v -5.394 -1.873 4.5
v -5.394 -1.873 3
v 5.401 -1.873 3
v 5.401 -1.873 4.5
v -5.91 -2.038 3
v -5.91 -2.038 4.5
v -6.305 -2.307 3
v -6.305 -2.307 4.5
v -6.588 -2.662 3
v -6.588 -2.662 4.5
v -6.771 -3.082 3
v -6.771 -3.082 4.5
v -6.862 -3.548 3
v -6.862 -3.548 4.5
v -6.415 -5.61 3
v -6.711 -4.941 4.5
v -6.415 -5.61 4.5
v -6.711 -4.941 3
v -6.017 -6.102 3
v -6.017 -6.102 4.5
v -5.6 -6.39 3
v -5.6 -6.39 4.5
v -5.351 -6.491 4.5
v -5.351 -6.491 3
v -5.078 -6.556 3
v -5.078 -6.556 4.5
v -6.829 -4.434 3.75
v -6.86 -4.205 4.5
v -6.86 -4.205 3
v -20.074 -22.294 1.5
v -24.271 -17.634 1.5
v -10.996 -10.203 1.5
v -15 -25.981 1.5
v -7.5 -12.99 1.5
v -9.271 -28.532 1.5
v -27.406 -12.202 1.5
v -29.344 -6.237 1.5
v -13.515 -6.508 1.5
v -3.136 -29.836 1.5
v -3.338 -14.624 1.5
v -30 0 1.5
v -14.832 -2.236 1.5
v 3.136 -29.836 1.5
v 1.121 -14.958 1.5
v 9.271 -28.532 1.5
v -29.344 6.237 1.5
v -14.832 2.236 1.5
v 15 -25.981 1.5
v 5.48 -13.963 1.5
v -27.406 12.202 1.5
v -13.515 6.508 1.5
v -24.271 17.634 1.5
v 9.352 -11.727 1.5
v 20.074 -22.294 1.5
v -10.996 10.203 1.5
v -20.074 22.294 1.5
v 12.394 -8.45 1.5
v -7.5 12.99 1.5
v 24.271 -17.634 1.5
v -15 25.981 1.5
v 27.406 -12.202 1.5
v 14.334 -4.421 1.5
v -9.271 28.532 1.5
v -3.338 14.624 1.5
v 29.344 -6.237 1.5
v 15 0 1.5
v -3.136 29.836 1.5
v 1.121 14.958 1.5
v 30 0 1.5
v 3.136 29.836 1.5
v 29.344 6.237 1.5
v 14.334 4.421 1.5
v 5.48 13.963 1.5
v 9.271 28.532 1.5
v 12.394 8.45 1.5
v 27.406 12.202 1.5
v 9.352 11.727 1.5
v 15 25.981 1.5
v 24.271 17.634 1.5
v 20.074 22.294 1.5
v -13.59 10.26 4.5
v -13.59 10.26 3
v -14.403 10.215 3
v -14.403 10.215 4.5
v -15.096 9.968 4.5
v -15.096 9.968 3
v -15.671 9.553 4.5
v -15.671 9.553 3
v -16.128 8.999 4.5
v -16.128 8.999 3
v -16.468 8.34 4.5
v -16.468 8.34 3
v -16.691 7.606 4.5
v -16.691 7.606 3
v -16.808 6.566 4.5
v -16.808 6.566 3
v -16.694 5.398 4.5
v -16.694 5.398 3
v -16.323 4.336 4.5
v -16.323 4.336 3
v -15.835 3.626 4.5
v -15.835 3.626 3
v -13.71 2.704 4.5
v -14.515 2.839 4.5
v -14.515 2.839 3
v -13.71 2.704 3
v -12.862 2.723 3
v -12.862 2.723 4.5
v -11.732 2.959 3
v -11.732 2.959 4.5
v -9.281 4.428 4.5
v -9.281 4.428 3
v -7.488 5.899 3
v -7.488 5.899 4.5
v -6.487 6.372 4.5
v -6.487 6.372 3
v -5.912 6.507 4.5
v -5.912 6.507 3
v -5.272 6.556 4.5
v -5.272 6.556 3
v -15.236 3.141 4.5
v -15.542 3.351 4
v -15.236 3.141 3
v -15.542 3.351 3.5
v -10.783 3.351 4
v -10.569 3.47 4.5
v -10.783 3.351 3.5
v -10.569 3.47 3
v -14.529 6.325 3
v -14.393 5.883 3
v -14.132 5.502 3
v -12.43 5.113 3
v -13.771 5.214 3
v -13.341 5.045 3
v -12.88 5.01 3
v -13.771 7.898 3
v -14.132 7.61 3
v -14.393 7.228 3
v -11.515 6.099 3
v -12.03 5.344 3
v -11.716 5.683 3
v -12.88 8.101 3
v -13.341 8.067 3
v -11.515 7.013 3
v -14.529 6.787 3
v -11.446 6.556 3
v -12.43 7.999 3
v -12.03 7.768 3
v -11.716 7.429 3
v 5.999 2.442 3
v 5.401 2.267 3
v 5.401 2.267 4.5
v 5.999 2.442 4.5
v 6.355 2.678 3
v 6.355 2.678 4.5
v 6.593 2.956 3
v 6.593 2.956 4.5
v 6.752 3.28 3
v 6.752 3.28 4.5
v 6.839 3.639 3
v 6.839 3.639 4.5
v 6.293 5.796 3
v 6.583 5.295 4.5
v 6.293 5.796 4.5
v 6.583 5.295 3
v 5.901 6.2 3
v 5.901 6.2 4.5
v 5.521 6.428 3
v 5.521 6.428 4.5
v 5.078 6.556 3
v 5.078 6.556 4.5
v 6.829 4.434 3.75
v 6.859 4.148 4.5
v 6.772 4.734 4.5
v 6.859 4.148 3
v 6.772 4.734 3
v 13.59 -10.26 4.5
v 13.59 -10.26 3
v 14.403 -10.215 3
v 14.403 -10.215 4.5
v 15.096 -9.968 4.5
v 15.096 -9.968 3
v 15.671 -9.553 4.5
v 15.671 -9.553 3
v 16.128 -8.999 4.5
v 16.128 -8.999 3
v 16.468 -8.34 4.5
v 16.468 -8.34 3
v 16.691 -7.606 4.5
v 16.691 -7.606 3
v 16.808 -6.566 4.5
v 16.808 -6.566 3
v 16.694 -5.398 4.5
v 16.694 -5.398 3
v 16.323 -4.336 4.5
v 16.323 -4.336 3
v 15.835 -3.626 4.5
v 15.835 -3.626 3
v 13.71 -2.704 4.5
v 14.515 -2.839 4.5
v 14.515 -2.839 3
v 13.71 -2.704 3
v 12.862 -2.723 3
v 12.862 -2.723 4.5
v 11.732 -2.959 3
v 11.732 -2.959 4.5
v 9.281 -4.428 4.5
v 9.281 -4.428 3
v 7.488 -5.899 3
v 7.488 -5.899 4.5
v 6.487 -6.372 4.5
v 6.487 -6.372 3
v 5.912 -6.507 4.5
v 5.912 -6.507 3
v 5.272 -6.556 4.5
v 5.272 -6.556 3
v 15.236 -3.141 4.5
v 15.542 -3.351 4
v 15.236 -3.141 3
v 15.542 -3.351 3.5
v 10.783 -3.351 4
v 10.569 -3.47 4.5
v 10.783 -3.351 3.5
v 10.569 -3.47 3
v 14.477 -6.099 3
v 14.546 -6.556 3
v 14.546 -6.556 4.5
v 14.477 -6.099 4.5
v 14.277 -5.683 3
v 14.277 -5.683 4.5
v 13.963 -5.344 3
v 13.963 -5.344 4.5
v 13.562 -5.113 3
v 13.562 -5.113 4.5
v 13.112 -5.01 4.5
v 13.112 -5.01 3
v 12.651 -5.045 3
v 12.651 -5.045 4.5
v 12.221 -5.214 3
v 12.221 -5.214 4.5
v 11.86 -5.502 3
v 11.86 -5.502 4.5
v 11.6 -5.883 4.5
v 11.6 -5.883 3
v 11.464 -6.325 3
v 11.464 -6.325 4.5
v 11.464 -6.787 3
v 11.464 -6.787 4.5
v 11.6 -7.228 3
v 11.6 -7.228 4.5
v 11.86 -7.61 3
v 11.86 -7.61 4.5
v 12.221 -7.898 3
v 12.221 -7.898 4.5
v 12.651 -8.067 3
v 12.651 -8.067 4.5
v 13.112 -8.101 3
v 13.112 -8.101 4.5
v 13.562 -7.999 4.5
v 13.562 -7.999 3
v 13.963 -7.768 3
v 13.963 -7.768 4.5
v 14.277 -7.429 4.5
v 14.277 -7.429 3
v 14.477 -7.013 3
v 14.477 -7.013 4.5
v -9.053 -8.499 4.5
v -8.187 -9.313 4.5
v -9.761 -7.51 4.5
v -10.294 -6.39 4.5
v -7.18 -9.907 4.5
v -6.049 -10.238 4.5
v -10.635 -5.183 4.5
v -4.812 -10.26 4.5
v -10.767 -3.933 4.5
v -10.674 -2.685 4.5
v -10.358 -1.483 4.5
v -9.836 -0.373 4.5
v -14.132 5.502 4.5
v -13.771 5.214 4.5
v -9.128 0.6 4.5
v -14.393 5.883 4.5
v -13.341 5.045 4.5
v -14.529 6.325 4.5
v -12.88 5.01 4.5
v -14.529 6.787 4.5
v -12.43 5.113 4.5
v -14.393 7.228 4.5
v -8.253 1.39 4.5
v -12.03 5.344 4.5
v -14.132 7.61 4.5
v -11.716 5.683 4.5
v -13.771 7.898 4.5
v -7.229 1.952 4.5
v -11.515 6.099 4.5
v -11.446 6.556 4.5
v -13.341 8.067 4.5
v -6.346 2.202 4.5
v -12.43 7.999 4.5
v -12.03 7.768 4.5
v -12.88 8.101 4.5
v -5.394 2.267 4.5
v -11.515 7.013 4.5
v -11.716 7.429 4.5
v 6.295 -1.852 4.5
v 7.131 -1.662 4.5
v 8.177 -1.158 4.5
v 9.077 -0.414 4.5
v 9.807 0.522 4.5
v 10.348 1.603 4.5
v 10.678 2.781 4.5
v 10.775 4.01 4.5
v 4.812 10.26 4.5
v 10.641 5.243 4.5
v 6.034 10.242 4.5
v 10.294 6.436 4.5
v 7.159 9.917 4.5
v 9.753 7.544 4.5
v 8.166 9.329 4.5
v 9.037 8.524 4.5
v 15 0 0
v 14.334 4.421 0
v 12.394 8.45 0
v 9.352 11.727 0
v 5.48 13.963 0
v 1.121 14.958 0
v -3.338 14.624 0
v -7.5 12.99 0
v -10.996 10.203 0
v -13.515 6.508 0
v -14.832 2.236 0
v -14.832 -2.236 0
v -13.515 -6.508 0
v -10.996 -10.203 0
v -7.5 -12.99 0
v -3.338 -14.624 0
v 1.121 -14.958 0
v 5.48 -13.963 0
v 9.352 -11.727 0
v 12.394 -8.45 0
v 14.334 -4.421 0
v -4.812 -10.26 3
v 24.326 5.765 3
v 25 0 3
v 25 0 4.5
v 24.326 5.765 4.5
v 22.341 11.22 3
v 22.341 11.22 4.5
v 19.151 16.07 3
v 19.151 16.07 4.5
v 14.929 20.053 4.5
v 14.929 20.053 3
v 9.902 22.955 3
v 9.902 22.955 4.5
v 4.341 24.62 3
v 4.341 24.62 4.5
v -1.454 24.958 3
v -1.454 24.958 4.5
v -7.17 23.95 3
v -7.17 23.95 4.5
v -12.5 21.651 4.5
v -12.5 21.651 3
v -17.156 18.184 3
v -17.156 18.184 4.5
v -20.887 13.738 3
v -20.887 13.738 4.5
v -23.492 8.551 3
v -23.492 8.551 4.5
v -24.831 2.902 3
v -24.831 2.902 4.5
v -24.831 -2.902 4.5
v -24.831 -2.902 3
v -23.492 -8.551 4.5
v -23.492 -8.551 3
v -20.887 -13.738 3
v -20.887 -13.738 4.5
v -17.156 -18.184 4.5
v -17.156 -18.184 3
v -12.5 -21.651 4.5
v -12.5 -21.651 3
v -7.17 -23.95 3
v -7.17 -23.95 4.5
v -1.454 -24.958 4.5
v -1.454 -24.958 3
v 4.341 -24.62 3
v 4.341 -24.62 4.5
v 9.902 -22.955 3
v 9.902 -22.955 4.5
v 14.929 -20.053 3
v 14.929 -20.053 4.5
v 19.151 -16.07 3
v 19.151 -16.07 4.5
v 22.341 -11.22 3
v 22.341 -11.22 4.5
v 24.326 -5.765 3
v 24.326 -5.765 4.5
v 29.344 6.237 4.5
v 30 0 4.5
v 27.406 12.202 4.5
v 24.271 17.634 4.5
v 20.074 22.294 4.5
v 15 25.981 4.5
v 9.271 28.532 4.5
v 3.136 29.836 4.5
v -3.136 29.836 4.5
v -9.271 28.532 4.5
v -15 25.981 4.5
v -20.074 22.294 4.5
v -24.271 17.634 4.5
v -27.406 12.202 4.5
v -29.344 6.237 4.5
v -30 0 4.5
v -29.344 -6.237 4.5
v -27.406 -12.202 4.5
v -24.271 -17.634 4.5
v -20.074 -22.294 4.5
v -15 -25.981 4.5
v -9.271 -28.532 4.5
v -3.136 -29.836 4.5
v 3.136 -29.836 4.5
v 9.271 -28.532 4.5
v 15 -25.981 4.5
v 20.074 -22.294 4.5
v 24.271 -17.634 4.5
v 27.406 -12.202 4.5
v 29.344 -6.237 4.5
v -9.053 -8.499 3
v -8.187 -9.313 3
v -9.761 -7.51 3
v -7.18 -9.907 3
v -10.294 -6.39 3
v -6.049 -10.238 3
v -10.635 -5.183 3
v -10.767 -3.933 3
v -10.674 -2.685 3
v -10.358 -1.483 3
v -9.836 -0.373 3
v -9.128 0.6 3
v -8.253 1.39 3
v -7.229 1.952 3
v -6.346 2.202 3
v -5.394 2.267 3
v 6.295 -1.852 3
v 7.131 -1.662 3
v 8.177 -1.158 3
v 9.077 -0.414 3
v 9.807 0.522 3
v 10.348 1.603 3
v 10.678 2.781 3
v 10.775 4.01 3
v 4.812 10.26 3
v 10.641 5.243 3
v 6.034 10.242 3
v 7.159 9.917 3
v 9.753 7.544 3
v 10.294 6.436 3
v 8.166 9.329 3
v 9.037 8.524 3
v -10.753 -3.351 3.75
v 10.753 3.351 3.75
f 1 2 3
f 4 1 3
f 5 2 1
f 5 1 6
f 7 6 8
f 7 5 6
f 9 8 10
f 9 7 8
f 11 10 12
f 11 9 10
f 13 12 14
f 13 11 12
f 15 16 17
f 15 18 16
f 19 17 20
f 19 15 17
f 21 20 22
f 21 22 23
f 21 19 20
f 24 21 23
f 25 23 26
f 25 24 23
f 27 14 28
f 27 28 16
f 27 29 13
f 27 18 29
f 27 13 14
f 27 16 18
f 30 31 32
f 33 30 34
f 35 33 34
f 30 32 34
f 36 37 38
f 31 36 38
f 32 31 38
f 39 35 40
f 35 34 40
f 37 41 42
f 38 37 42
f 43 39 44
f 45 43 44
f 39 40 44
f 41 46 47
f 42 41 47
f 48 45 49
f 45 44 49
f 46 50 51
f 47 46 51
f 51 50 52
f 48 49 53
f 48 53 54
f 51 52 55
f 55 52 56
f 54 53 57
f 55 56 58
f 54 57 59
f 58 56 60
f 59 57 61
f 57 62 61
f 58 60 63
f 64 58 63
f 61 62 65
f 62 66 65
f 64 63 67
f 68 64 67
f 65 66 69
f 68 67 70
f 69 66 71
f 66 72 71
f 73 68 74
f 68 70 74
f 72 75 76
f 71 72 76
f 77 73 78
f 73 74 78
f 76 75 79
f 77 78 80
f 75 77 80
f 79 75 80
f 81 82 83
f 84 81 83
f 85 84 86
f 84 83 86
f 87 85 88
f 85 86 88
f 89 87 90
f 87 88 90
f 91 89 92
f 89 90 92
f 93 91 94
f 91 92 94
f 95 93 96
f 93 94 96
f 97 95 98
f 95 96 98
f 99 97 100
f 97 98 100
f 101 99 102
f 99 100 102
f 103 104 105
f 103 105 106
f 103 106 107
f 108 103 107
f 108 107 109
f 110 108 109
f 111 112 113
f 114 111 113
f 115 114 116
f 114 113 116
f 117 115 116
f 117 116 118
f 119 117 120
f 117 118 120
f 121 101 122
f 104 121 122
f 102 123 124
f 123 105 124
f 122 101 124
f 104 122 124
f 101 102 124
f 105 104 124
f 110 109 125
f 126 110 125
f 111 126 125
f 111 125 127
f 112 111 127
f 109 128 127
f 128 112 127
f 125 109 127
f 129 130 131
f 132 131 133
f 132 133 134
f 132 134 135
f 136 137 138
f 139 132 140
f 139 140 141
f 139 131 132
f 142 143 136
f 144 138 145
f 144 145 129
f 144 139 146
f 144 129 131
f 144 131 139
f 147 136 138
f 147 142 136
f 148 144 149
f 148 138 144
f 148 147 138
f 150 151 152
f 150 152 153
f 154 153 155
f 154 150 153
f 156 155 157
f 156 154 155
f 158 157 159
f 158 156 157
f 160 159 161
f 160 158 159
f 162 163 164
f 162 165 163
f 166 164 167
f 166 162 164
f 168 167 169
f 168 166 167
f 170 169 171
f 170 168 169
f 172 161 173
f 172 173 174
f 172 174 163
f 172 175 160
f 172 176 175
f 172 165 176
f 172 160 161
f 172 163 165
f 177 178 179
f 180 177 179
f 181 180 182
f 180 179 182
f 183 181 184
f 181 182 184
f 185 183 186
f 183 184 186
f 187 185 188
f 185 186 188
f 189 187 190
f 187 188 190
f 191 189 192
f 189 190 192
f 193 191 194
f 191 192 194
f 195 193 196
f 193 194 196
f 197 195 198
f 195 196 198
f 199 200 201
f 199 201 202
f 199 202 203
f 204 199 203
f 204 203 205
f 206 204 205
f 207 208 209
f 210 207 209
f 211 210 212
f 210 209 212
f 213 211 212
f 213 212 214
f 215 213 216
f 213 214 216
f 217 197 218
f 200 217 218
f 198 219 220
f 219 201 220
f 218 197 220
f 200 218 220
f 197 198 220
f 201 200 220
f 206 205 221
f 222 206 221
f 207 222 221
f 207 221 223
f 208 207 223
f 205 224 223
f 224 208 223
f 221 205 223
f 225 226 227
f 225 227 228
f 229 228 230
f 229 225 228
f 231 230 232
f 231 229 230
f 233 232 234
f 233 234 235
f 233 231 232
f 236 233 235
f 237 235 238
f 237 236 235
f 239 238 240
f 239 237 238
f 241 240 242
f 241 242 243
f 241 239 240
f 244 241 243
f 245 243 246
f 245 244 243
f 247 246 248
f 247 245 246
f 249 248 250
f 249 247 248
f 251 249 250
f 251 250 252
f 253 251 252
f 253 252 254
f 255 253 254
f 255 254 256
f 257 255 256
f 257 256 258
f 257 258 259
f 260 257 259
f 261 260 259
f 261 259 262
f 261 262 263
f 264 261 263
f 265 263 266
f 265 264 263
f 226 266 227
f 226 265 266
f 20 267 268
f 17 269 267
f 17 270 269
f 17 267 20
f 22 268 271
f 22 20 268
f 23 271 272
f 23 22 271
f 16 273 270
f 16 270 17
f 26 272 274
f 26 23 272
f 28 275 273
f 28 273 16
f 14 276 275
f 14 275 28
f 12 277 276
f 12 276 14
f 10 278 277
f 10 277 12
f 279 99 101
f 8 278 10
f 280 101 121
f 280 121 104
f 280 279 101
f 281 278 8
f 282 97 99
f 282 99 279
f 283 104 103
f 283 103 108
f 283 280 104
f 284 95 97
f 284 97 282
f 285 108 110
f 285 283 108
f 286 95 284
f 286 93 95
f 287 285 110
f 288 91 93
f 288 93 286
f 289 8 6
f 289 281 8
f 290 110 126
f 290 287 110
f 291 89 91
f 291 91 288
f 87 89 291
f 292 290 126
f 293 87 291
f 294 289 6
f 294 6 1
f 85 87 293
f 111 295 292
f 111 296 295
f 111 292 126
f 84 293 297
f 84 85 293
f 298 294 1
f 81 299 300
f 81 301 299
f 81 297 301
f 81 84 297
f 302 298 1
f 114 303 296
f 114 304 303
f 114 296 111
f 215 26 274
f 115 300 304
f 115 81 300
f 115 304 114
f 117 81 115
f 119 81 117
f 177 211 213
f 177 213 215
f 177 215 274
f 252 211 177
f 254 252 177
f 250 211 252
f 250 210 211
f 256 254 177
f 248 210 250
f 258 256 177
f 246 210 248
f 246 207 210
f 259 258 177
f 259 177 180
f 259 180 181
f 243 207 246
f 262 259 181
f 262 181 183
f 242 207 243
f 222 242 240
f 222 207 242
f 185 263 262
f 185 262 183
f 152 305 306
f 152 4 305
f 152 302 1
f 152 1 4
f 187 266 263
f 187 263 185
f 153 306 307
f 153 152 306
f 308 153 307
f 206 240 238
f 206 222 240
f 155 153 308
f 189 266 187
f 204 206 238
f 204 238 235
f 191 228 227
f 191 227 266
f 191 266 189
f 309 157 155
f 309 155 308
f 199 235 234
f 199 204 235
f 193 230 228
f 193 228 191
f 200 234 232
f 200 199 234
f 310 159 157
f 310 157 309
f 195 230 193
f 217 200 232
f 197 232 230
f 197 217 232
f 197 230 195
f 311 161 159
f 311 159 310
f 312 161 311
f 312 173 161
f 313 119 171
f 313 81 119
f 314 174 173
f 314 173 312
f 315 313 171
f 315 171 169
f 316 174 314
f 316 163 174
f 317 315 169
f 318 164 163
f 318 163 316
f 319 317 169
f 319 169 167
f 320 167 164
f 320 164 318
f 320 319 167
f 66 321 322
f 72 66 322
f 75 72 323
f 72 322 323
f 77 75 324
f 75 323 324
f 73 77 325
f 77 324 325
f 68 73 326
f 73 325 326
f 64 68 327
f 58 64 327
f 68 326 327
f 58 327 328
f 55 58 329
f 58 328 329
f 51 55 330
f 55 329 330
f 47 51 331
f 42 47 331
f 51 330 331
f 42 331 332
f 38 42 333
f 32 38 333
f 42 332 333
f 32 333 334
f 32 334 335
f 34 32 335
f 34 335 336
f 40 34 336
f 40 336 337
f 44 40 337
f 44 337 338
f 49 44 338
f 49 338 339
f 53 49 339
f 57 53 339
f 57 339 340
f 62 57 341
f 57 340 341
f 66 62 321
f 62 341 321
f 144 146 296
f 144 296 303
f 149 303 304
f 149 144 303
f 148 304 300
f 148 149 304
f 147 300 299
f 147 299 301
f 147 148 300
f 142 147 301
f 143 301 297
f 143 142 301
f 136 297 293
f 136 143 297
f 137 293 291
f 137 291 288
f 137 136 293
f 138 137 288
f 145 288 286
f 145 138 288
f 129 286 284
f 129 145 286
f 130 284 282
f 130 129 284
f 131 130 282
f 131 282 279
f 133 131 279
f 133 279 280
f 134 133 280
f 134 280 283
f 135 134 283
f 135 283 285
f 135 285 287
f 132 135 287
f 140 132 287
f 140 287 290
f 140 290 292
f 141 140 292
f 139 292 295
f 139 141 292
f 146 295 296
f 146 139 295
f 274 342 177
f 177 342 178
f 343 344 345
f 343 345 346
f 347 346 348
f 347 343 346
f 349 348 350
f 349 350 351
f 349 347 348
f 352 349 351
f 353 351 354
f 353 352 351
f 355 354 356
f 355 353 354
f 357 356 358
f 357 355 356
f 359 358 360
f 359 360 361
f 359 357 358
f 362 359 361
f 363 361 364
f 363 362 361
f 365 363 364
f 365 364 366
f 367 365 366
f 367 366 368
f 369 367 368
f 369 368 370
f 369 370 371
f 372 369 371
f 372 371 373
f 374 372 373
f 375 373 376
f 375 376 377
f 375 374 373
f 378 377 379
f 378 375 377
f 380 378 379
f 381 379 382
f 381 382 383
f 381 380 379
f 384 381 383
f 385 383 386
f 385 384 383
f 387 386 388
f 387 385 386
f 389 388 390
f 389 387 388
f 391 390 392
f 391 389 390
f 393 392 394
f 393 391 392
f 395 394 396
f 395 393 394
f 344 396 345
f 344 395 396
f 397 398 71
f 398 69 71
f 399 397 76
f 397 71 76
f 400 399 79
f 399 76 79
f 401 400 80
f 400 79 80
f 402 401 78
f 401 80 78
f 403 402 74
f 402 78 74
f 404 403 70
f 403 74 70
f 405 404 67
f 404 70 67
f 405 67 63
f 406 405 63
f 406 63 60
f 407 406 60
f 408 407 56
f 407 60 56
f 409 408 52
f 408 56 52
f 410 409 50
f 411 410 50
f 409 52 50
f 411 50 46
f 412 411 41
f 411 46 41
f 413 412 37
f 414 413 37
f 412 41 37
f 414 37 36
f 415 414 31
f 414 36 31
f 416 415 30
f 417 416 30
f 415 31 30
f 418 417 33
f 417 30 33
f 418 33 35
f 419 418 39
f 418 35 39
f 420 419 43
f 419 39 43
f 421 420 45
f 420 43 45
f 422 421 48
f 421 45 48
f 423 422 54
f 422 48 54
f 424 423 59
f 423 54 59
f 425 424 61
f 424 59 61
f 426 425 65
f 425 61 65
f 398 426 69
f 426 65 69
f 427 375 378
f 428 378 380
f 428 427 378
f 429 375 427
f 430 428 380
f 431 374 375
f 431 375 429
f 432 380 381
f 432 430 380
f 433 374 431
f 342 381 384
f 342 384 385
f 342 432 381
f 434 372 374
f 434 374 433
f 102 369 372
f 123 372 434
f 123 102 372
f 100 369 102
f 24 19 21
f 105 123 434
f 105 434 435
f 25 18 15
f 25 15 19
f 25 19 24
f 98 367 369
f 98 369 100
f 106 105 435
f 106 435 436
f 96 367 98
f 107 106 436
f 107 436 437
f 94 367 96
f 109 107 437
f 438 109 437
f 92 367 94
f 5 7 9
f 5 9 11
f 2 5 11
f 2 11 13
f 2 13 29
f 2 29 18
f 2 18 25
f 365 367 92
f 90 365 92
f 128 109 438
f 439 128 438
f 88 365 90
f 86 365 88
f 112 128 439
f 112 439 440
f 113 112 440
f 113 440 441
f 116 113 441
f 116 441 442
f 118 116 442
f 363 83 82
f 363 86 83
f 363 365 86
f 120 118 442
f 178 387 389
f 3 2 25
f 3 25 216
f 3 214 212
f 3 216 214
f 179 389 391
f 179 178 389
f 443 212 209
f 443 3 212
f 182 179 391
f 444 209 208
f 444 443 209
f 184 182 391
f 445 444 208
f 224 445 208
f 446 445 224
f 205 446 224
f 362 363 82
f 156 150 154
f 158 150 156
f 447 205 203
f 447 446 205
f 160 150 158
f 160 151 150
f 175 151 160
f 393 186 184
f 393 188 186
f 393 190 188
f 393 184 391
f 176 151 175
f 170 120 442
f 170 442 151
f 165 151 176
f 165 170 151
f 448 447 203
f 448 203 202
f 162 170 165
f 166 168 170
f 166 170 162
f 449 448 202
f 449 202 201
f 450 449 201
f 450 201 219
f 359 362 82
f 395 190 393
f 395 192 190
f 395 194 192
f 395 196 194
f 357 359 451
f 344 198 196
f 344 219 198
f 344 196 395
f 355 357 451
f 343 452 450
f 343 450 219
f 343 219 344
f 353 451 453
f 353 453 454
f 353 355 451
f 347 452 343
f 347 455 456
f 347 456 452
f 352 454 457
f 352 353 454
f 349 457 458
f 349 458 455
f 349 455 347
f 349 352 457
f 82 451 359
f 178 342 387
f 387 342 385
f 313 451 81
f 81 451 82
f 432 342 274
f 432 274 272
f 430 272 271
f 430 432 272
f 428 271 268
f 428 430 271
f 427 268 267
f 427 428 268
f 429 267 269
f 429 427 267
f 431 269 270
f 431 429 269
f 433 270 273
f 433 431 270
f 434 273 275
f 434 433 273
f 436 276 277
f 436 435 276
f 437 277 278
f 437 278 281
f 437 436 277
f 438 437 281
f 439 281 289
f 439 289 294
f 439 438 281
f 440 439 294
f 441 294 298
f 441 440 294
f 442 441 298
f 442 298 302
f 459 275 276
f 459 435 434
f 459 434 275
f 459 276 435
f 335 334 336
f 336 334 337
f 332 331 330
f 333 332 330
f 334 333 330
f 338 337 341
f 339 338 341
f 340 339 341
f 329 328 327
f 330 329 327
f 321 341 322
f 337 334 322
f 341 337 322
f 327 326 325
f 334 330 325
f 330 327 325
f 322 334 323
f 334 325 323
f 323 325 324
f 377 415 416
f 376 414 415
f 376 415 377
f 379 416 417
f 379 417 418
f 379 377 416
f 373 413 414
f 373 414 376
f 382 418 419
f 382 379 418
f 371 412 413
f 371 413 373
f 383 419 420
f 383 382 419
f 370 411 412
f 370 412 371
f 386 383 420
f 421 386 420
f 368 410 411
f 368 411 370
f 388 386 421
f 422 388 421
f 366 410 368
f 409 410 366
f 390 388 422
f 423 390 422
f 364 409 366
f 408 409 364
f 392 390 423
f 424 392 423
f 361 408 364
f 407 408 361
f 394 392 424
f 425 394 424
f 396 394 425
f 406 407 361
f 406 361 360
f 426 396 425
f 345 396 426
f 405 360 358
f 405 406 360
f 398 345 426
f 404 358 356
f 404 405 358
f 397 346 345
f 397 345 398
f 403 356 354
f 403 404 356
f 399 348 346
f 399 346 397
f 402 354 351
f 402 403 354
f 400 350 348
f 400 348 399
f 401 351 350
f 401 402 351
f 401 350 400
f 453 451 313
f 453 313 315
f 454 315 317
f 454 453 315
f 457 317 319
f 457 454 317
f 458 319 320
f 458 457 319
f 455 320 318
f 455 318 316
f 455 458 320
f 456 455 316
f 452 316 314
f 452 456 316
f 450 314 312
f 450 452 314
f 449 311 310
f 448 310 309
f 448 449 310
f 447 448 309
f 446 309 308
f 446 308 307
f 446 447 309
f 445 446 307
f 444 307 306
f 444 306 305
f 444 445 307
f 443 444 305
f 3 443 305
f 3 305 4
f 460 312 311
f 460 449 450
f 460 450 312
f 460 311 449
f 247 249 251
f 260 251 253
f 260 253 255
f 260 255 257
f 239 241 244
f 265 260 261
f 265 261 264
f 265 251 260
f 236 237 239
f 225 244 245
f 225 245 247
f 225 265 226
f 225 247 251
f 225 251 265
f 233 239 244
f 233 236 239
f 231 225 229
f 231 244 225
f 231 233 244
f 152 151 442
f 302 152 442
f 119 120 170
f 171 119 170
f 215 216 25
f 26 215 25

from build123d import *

# Parameters (mm, degrees)
SZKIC2_R                    = 15
DODANIE_WYCI_GNI_CIE1_DEPTH = 1.5
SZKIC3_R                    = 30
DODANIE_WYCI_GNI_CIE2_DEPTH = 1.5
SZKIC4_R                    = 1.549896932
DODANIE_WYCI_GNI_CIE3_DEPTH = 1.5
SZKIC5_R                    = 30
SZKIC5_R_2                  = 25
DODANIE_WYCI_GNI_CIE4_DEPTH = 1.5


with BuildPart() as part:
    # Szkic2 → Dodanie-wyciągnięcie1 (new body)
    with BuildSketch(Plane.XY):
        Circle(SZKIC2_R)
    extrude(amount=DODANIE_WYCI_GNI_CIE1_DEPTH)

    # Szkic3 → Dodanie-wyciągnięcie2 (add)
    with BuildSketch(Plane.XY.offset(1.5)):
        Circle(SZKIC3_R)
    extrude(amount=DODANIE_WYCI_GNI_CIE2_DEPTH)

    # Szkic4 → Dodanie-wyciągnięcie3 (add)
    with BuildSketch(Plane.XY.offset(3)):
        with BuildLine():
            Line((4.812477136, 10.260072193), (-13.590223768, 10.260072193))
            add(Edge.make_bspline(
                [(-13.590223768, 10.260072193), (-17.118745335, 10.525910667), (-18.036890573, 2.046692384), (-9.462596481, 2.827097674), (-7.837333483, 6.548859819), (-5.272128066, 6.55590597)],
                knots=[0, 0, 0, 0, 0.432020753, 0.673133157, 1, 1, 1, 1], degree=3))
            Line((-5.272128066, 6.55590597), (5.077687391, 6.55590597))
            add(Edge.make_bspline(
                [(5.400788266, 2.266678597), (6.693166153, 2.459988983), (7.256310662, 4.478210573), (6.099978239, 6.399808673), (5.077687391, 6.55590597)],
                knots=[0, 0, 0, 0, 0.494793037, 1, 1, 1, 1], degree=3))
            Line((5.400788266, 2.266678597), (-5.393615059, 2.266678597))
            add(Edge.make_bspline(
                [(-4.812477136, -10.260072193), (-8.43662289, -10.67337056), (-13.131808051, -3.70534385), (-8.393582508, 2.373047437), (-5.393615059, 2.266678597)],
                knots=[0, 0, 0, 0, 0.544342745, 1, 1, 1, 1], degree=3))
            Line((-4.812477136, -10.260072193), (13.590223768, -10.260072193))
            add(Edge.make_bspline(
                [(13.590223768, -10.260072193), (17.118745335, -10.525910667), (18.036890573, -2.046692384), (9.462596481, -2.827097674), (7.837333483, -6.548859819), (5.272128066, -6.55590597)],
                knots=[0, 0, 0, 0, 0.432020753, 0.673133157, 1, 1, 1, 1], degree=3))
            Line((5.272128066, -6.55590597), (-5.077687391, -6.55590597))
            add(Edge.make_bspline(
                [(-5.393615059, -1.873220172), (-6.707130139, -2.111629026), (-7.285258718, -4.388625667), (-6.108553028, -6.392911018), (-5.077687391, -6.55590597)],
                knots=[0, 0, 0, 0, 0.526459521, 1, 1, 1, 1], degree=3))
            Line((-5.393615059, -1.873220172), (5.400788266, -1.873220172))
            add(Edge.make_bspline(
                [(4.812477136, 10.260072193), (8.408712031, 10.687954055), (13.196256947, 3.738137397), (8.332970423, -2.090379005), (5.400788266, -1.873220172)],
                knots=[0, 0, 0, 0, 0.552476507, 1, 1, 1, 1], degree=3))
        make_face()
        with Locations((-12.996205696, 6.55590597)):
            Circle(SZKIC4_R, mode=Mode.SUBTRACT)
        with Locations((12.996205696, -6.55590597)):
            Circle(SZKIC4_R, mode=Mode.SUBTRACT)
    extrude(amount=DODANIE_WYCI_GNI_CIE3_DEPTH)

    # Szkic5 → Dodanie-wyciągnięcie4 (add)
    with BuildSketch(Plane.XY.offset(3)):
        Circle(SZKIC5_R)
        Circle(SZKIC5_R_2, mode=Mode.SUBTRACT)
    extrude(amount=DODANIE_WYCI_GNI_CIE4_DEPTH)


solid = part.part
